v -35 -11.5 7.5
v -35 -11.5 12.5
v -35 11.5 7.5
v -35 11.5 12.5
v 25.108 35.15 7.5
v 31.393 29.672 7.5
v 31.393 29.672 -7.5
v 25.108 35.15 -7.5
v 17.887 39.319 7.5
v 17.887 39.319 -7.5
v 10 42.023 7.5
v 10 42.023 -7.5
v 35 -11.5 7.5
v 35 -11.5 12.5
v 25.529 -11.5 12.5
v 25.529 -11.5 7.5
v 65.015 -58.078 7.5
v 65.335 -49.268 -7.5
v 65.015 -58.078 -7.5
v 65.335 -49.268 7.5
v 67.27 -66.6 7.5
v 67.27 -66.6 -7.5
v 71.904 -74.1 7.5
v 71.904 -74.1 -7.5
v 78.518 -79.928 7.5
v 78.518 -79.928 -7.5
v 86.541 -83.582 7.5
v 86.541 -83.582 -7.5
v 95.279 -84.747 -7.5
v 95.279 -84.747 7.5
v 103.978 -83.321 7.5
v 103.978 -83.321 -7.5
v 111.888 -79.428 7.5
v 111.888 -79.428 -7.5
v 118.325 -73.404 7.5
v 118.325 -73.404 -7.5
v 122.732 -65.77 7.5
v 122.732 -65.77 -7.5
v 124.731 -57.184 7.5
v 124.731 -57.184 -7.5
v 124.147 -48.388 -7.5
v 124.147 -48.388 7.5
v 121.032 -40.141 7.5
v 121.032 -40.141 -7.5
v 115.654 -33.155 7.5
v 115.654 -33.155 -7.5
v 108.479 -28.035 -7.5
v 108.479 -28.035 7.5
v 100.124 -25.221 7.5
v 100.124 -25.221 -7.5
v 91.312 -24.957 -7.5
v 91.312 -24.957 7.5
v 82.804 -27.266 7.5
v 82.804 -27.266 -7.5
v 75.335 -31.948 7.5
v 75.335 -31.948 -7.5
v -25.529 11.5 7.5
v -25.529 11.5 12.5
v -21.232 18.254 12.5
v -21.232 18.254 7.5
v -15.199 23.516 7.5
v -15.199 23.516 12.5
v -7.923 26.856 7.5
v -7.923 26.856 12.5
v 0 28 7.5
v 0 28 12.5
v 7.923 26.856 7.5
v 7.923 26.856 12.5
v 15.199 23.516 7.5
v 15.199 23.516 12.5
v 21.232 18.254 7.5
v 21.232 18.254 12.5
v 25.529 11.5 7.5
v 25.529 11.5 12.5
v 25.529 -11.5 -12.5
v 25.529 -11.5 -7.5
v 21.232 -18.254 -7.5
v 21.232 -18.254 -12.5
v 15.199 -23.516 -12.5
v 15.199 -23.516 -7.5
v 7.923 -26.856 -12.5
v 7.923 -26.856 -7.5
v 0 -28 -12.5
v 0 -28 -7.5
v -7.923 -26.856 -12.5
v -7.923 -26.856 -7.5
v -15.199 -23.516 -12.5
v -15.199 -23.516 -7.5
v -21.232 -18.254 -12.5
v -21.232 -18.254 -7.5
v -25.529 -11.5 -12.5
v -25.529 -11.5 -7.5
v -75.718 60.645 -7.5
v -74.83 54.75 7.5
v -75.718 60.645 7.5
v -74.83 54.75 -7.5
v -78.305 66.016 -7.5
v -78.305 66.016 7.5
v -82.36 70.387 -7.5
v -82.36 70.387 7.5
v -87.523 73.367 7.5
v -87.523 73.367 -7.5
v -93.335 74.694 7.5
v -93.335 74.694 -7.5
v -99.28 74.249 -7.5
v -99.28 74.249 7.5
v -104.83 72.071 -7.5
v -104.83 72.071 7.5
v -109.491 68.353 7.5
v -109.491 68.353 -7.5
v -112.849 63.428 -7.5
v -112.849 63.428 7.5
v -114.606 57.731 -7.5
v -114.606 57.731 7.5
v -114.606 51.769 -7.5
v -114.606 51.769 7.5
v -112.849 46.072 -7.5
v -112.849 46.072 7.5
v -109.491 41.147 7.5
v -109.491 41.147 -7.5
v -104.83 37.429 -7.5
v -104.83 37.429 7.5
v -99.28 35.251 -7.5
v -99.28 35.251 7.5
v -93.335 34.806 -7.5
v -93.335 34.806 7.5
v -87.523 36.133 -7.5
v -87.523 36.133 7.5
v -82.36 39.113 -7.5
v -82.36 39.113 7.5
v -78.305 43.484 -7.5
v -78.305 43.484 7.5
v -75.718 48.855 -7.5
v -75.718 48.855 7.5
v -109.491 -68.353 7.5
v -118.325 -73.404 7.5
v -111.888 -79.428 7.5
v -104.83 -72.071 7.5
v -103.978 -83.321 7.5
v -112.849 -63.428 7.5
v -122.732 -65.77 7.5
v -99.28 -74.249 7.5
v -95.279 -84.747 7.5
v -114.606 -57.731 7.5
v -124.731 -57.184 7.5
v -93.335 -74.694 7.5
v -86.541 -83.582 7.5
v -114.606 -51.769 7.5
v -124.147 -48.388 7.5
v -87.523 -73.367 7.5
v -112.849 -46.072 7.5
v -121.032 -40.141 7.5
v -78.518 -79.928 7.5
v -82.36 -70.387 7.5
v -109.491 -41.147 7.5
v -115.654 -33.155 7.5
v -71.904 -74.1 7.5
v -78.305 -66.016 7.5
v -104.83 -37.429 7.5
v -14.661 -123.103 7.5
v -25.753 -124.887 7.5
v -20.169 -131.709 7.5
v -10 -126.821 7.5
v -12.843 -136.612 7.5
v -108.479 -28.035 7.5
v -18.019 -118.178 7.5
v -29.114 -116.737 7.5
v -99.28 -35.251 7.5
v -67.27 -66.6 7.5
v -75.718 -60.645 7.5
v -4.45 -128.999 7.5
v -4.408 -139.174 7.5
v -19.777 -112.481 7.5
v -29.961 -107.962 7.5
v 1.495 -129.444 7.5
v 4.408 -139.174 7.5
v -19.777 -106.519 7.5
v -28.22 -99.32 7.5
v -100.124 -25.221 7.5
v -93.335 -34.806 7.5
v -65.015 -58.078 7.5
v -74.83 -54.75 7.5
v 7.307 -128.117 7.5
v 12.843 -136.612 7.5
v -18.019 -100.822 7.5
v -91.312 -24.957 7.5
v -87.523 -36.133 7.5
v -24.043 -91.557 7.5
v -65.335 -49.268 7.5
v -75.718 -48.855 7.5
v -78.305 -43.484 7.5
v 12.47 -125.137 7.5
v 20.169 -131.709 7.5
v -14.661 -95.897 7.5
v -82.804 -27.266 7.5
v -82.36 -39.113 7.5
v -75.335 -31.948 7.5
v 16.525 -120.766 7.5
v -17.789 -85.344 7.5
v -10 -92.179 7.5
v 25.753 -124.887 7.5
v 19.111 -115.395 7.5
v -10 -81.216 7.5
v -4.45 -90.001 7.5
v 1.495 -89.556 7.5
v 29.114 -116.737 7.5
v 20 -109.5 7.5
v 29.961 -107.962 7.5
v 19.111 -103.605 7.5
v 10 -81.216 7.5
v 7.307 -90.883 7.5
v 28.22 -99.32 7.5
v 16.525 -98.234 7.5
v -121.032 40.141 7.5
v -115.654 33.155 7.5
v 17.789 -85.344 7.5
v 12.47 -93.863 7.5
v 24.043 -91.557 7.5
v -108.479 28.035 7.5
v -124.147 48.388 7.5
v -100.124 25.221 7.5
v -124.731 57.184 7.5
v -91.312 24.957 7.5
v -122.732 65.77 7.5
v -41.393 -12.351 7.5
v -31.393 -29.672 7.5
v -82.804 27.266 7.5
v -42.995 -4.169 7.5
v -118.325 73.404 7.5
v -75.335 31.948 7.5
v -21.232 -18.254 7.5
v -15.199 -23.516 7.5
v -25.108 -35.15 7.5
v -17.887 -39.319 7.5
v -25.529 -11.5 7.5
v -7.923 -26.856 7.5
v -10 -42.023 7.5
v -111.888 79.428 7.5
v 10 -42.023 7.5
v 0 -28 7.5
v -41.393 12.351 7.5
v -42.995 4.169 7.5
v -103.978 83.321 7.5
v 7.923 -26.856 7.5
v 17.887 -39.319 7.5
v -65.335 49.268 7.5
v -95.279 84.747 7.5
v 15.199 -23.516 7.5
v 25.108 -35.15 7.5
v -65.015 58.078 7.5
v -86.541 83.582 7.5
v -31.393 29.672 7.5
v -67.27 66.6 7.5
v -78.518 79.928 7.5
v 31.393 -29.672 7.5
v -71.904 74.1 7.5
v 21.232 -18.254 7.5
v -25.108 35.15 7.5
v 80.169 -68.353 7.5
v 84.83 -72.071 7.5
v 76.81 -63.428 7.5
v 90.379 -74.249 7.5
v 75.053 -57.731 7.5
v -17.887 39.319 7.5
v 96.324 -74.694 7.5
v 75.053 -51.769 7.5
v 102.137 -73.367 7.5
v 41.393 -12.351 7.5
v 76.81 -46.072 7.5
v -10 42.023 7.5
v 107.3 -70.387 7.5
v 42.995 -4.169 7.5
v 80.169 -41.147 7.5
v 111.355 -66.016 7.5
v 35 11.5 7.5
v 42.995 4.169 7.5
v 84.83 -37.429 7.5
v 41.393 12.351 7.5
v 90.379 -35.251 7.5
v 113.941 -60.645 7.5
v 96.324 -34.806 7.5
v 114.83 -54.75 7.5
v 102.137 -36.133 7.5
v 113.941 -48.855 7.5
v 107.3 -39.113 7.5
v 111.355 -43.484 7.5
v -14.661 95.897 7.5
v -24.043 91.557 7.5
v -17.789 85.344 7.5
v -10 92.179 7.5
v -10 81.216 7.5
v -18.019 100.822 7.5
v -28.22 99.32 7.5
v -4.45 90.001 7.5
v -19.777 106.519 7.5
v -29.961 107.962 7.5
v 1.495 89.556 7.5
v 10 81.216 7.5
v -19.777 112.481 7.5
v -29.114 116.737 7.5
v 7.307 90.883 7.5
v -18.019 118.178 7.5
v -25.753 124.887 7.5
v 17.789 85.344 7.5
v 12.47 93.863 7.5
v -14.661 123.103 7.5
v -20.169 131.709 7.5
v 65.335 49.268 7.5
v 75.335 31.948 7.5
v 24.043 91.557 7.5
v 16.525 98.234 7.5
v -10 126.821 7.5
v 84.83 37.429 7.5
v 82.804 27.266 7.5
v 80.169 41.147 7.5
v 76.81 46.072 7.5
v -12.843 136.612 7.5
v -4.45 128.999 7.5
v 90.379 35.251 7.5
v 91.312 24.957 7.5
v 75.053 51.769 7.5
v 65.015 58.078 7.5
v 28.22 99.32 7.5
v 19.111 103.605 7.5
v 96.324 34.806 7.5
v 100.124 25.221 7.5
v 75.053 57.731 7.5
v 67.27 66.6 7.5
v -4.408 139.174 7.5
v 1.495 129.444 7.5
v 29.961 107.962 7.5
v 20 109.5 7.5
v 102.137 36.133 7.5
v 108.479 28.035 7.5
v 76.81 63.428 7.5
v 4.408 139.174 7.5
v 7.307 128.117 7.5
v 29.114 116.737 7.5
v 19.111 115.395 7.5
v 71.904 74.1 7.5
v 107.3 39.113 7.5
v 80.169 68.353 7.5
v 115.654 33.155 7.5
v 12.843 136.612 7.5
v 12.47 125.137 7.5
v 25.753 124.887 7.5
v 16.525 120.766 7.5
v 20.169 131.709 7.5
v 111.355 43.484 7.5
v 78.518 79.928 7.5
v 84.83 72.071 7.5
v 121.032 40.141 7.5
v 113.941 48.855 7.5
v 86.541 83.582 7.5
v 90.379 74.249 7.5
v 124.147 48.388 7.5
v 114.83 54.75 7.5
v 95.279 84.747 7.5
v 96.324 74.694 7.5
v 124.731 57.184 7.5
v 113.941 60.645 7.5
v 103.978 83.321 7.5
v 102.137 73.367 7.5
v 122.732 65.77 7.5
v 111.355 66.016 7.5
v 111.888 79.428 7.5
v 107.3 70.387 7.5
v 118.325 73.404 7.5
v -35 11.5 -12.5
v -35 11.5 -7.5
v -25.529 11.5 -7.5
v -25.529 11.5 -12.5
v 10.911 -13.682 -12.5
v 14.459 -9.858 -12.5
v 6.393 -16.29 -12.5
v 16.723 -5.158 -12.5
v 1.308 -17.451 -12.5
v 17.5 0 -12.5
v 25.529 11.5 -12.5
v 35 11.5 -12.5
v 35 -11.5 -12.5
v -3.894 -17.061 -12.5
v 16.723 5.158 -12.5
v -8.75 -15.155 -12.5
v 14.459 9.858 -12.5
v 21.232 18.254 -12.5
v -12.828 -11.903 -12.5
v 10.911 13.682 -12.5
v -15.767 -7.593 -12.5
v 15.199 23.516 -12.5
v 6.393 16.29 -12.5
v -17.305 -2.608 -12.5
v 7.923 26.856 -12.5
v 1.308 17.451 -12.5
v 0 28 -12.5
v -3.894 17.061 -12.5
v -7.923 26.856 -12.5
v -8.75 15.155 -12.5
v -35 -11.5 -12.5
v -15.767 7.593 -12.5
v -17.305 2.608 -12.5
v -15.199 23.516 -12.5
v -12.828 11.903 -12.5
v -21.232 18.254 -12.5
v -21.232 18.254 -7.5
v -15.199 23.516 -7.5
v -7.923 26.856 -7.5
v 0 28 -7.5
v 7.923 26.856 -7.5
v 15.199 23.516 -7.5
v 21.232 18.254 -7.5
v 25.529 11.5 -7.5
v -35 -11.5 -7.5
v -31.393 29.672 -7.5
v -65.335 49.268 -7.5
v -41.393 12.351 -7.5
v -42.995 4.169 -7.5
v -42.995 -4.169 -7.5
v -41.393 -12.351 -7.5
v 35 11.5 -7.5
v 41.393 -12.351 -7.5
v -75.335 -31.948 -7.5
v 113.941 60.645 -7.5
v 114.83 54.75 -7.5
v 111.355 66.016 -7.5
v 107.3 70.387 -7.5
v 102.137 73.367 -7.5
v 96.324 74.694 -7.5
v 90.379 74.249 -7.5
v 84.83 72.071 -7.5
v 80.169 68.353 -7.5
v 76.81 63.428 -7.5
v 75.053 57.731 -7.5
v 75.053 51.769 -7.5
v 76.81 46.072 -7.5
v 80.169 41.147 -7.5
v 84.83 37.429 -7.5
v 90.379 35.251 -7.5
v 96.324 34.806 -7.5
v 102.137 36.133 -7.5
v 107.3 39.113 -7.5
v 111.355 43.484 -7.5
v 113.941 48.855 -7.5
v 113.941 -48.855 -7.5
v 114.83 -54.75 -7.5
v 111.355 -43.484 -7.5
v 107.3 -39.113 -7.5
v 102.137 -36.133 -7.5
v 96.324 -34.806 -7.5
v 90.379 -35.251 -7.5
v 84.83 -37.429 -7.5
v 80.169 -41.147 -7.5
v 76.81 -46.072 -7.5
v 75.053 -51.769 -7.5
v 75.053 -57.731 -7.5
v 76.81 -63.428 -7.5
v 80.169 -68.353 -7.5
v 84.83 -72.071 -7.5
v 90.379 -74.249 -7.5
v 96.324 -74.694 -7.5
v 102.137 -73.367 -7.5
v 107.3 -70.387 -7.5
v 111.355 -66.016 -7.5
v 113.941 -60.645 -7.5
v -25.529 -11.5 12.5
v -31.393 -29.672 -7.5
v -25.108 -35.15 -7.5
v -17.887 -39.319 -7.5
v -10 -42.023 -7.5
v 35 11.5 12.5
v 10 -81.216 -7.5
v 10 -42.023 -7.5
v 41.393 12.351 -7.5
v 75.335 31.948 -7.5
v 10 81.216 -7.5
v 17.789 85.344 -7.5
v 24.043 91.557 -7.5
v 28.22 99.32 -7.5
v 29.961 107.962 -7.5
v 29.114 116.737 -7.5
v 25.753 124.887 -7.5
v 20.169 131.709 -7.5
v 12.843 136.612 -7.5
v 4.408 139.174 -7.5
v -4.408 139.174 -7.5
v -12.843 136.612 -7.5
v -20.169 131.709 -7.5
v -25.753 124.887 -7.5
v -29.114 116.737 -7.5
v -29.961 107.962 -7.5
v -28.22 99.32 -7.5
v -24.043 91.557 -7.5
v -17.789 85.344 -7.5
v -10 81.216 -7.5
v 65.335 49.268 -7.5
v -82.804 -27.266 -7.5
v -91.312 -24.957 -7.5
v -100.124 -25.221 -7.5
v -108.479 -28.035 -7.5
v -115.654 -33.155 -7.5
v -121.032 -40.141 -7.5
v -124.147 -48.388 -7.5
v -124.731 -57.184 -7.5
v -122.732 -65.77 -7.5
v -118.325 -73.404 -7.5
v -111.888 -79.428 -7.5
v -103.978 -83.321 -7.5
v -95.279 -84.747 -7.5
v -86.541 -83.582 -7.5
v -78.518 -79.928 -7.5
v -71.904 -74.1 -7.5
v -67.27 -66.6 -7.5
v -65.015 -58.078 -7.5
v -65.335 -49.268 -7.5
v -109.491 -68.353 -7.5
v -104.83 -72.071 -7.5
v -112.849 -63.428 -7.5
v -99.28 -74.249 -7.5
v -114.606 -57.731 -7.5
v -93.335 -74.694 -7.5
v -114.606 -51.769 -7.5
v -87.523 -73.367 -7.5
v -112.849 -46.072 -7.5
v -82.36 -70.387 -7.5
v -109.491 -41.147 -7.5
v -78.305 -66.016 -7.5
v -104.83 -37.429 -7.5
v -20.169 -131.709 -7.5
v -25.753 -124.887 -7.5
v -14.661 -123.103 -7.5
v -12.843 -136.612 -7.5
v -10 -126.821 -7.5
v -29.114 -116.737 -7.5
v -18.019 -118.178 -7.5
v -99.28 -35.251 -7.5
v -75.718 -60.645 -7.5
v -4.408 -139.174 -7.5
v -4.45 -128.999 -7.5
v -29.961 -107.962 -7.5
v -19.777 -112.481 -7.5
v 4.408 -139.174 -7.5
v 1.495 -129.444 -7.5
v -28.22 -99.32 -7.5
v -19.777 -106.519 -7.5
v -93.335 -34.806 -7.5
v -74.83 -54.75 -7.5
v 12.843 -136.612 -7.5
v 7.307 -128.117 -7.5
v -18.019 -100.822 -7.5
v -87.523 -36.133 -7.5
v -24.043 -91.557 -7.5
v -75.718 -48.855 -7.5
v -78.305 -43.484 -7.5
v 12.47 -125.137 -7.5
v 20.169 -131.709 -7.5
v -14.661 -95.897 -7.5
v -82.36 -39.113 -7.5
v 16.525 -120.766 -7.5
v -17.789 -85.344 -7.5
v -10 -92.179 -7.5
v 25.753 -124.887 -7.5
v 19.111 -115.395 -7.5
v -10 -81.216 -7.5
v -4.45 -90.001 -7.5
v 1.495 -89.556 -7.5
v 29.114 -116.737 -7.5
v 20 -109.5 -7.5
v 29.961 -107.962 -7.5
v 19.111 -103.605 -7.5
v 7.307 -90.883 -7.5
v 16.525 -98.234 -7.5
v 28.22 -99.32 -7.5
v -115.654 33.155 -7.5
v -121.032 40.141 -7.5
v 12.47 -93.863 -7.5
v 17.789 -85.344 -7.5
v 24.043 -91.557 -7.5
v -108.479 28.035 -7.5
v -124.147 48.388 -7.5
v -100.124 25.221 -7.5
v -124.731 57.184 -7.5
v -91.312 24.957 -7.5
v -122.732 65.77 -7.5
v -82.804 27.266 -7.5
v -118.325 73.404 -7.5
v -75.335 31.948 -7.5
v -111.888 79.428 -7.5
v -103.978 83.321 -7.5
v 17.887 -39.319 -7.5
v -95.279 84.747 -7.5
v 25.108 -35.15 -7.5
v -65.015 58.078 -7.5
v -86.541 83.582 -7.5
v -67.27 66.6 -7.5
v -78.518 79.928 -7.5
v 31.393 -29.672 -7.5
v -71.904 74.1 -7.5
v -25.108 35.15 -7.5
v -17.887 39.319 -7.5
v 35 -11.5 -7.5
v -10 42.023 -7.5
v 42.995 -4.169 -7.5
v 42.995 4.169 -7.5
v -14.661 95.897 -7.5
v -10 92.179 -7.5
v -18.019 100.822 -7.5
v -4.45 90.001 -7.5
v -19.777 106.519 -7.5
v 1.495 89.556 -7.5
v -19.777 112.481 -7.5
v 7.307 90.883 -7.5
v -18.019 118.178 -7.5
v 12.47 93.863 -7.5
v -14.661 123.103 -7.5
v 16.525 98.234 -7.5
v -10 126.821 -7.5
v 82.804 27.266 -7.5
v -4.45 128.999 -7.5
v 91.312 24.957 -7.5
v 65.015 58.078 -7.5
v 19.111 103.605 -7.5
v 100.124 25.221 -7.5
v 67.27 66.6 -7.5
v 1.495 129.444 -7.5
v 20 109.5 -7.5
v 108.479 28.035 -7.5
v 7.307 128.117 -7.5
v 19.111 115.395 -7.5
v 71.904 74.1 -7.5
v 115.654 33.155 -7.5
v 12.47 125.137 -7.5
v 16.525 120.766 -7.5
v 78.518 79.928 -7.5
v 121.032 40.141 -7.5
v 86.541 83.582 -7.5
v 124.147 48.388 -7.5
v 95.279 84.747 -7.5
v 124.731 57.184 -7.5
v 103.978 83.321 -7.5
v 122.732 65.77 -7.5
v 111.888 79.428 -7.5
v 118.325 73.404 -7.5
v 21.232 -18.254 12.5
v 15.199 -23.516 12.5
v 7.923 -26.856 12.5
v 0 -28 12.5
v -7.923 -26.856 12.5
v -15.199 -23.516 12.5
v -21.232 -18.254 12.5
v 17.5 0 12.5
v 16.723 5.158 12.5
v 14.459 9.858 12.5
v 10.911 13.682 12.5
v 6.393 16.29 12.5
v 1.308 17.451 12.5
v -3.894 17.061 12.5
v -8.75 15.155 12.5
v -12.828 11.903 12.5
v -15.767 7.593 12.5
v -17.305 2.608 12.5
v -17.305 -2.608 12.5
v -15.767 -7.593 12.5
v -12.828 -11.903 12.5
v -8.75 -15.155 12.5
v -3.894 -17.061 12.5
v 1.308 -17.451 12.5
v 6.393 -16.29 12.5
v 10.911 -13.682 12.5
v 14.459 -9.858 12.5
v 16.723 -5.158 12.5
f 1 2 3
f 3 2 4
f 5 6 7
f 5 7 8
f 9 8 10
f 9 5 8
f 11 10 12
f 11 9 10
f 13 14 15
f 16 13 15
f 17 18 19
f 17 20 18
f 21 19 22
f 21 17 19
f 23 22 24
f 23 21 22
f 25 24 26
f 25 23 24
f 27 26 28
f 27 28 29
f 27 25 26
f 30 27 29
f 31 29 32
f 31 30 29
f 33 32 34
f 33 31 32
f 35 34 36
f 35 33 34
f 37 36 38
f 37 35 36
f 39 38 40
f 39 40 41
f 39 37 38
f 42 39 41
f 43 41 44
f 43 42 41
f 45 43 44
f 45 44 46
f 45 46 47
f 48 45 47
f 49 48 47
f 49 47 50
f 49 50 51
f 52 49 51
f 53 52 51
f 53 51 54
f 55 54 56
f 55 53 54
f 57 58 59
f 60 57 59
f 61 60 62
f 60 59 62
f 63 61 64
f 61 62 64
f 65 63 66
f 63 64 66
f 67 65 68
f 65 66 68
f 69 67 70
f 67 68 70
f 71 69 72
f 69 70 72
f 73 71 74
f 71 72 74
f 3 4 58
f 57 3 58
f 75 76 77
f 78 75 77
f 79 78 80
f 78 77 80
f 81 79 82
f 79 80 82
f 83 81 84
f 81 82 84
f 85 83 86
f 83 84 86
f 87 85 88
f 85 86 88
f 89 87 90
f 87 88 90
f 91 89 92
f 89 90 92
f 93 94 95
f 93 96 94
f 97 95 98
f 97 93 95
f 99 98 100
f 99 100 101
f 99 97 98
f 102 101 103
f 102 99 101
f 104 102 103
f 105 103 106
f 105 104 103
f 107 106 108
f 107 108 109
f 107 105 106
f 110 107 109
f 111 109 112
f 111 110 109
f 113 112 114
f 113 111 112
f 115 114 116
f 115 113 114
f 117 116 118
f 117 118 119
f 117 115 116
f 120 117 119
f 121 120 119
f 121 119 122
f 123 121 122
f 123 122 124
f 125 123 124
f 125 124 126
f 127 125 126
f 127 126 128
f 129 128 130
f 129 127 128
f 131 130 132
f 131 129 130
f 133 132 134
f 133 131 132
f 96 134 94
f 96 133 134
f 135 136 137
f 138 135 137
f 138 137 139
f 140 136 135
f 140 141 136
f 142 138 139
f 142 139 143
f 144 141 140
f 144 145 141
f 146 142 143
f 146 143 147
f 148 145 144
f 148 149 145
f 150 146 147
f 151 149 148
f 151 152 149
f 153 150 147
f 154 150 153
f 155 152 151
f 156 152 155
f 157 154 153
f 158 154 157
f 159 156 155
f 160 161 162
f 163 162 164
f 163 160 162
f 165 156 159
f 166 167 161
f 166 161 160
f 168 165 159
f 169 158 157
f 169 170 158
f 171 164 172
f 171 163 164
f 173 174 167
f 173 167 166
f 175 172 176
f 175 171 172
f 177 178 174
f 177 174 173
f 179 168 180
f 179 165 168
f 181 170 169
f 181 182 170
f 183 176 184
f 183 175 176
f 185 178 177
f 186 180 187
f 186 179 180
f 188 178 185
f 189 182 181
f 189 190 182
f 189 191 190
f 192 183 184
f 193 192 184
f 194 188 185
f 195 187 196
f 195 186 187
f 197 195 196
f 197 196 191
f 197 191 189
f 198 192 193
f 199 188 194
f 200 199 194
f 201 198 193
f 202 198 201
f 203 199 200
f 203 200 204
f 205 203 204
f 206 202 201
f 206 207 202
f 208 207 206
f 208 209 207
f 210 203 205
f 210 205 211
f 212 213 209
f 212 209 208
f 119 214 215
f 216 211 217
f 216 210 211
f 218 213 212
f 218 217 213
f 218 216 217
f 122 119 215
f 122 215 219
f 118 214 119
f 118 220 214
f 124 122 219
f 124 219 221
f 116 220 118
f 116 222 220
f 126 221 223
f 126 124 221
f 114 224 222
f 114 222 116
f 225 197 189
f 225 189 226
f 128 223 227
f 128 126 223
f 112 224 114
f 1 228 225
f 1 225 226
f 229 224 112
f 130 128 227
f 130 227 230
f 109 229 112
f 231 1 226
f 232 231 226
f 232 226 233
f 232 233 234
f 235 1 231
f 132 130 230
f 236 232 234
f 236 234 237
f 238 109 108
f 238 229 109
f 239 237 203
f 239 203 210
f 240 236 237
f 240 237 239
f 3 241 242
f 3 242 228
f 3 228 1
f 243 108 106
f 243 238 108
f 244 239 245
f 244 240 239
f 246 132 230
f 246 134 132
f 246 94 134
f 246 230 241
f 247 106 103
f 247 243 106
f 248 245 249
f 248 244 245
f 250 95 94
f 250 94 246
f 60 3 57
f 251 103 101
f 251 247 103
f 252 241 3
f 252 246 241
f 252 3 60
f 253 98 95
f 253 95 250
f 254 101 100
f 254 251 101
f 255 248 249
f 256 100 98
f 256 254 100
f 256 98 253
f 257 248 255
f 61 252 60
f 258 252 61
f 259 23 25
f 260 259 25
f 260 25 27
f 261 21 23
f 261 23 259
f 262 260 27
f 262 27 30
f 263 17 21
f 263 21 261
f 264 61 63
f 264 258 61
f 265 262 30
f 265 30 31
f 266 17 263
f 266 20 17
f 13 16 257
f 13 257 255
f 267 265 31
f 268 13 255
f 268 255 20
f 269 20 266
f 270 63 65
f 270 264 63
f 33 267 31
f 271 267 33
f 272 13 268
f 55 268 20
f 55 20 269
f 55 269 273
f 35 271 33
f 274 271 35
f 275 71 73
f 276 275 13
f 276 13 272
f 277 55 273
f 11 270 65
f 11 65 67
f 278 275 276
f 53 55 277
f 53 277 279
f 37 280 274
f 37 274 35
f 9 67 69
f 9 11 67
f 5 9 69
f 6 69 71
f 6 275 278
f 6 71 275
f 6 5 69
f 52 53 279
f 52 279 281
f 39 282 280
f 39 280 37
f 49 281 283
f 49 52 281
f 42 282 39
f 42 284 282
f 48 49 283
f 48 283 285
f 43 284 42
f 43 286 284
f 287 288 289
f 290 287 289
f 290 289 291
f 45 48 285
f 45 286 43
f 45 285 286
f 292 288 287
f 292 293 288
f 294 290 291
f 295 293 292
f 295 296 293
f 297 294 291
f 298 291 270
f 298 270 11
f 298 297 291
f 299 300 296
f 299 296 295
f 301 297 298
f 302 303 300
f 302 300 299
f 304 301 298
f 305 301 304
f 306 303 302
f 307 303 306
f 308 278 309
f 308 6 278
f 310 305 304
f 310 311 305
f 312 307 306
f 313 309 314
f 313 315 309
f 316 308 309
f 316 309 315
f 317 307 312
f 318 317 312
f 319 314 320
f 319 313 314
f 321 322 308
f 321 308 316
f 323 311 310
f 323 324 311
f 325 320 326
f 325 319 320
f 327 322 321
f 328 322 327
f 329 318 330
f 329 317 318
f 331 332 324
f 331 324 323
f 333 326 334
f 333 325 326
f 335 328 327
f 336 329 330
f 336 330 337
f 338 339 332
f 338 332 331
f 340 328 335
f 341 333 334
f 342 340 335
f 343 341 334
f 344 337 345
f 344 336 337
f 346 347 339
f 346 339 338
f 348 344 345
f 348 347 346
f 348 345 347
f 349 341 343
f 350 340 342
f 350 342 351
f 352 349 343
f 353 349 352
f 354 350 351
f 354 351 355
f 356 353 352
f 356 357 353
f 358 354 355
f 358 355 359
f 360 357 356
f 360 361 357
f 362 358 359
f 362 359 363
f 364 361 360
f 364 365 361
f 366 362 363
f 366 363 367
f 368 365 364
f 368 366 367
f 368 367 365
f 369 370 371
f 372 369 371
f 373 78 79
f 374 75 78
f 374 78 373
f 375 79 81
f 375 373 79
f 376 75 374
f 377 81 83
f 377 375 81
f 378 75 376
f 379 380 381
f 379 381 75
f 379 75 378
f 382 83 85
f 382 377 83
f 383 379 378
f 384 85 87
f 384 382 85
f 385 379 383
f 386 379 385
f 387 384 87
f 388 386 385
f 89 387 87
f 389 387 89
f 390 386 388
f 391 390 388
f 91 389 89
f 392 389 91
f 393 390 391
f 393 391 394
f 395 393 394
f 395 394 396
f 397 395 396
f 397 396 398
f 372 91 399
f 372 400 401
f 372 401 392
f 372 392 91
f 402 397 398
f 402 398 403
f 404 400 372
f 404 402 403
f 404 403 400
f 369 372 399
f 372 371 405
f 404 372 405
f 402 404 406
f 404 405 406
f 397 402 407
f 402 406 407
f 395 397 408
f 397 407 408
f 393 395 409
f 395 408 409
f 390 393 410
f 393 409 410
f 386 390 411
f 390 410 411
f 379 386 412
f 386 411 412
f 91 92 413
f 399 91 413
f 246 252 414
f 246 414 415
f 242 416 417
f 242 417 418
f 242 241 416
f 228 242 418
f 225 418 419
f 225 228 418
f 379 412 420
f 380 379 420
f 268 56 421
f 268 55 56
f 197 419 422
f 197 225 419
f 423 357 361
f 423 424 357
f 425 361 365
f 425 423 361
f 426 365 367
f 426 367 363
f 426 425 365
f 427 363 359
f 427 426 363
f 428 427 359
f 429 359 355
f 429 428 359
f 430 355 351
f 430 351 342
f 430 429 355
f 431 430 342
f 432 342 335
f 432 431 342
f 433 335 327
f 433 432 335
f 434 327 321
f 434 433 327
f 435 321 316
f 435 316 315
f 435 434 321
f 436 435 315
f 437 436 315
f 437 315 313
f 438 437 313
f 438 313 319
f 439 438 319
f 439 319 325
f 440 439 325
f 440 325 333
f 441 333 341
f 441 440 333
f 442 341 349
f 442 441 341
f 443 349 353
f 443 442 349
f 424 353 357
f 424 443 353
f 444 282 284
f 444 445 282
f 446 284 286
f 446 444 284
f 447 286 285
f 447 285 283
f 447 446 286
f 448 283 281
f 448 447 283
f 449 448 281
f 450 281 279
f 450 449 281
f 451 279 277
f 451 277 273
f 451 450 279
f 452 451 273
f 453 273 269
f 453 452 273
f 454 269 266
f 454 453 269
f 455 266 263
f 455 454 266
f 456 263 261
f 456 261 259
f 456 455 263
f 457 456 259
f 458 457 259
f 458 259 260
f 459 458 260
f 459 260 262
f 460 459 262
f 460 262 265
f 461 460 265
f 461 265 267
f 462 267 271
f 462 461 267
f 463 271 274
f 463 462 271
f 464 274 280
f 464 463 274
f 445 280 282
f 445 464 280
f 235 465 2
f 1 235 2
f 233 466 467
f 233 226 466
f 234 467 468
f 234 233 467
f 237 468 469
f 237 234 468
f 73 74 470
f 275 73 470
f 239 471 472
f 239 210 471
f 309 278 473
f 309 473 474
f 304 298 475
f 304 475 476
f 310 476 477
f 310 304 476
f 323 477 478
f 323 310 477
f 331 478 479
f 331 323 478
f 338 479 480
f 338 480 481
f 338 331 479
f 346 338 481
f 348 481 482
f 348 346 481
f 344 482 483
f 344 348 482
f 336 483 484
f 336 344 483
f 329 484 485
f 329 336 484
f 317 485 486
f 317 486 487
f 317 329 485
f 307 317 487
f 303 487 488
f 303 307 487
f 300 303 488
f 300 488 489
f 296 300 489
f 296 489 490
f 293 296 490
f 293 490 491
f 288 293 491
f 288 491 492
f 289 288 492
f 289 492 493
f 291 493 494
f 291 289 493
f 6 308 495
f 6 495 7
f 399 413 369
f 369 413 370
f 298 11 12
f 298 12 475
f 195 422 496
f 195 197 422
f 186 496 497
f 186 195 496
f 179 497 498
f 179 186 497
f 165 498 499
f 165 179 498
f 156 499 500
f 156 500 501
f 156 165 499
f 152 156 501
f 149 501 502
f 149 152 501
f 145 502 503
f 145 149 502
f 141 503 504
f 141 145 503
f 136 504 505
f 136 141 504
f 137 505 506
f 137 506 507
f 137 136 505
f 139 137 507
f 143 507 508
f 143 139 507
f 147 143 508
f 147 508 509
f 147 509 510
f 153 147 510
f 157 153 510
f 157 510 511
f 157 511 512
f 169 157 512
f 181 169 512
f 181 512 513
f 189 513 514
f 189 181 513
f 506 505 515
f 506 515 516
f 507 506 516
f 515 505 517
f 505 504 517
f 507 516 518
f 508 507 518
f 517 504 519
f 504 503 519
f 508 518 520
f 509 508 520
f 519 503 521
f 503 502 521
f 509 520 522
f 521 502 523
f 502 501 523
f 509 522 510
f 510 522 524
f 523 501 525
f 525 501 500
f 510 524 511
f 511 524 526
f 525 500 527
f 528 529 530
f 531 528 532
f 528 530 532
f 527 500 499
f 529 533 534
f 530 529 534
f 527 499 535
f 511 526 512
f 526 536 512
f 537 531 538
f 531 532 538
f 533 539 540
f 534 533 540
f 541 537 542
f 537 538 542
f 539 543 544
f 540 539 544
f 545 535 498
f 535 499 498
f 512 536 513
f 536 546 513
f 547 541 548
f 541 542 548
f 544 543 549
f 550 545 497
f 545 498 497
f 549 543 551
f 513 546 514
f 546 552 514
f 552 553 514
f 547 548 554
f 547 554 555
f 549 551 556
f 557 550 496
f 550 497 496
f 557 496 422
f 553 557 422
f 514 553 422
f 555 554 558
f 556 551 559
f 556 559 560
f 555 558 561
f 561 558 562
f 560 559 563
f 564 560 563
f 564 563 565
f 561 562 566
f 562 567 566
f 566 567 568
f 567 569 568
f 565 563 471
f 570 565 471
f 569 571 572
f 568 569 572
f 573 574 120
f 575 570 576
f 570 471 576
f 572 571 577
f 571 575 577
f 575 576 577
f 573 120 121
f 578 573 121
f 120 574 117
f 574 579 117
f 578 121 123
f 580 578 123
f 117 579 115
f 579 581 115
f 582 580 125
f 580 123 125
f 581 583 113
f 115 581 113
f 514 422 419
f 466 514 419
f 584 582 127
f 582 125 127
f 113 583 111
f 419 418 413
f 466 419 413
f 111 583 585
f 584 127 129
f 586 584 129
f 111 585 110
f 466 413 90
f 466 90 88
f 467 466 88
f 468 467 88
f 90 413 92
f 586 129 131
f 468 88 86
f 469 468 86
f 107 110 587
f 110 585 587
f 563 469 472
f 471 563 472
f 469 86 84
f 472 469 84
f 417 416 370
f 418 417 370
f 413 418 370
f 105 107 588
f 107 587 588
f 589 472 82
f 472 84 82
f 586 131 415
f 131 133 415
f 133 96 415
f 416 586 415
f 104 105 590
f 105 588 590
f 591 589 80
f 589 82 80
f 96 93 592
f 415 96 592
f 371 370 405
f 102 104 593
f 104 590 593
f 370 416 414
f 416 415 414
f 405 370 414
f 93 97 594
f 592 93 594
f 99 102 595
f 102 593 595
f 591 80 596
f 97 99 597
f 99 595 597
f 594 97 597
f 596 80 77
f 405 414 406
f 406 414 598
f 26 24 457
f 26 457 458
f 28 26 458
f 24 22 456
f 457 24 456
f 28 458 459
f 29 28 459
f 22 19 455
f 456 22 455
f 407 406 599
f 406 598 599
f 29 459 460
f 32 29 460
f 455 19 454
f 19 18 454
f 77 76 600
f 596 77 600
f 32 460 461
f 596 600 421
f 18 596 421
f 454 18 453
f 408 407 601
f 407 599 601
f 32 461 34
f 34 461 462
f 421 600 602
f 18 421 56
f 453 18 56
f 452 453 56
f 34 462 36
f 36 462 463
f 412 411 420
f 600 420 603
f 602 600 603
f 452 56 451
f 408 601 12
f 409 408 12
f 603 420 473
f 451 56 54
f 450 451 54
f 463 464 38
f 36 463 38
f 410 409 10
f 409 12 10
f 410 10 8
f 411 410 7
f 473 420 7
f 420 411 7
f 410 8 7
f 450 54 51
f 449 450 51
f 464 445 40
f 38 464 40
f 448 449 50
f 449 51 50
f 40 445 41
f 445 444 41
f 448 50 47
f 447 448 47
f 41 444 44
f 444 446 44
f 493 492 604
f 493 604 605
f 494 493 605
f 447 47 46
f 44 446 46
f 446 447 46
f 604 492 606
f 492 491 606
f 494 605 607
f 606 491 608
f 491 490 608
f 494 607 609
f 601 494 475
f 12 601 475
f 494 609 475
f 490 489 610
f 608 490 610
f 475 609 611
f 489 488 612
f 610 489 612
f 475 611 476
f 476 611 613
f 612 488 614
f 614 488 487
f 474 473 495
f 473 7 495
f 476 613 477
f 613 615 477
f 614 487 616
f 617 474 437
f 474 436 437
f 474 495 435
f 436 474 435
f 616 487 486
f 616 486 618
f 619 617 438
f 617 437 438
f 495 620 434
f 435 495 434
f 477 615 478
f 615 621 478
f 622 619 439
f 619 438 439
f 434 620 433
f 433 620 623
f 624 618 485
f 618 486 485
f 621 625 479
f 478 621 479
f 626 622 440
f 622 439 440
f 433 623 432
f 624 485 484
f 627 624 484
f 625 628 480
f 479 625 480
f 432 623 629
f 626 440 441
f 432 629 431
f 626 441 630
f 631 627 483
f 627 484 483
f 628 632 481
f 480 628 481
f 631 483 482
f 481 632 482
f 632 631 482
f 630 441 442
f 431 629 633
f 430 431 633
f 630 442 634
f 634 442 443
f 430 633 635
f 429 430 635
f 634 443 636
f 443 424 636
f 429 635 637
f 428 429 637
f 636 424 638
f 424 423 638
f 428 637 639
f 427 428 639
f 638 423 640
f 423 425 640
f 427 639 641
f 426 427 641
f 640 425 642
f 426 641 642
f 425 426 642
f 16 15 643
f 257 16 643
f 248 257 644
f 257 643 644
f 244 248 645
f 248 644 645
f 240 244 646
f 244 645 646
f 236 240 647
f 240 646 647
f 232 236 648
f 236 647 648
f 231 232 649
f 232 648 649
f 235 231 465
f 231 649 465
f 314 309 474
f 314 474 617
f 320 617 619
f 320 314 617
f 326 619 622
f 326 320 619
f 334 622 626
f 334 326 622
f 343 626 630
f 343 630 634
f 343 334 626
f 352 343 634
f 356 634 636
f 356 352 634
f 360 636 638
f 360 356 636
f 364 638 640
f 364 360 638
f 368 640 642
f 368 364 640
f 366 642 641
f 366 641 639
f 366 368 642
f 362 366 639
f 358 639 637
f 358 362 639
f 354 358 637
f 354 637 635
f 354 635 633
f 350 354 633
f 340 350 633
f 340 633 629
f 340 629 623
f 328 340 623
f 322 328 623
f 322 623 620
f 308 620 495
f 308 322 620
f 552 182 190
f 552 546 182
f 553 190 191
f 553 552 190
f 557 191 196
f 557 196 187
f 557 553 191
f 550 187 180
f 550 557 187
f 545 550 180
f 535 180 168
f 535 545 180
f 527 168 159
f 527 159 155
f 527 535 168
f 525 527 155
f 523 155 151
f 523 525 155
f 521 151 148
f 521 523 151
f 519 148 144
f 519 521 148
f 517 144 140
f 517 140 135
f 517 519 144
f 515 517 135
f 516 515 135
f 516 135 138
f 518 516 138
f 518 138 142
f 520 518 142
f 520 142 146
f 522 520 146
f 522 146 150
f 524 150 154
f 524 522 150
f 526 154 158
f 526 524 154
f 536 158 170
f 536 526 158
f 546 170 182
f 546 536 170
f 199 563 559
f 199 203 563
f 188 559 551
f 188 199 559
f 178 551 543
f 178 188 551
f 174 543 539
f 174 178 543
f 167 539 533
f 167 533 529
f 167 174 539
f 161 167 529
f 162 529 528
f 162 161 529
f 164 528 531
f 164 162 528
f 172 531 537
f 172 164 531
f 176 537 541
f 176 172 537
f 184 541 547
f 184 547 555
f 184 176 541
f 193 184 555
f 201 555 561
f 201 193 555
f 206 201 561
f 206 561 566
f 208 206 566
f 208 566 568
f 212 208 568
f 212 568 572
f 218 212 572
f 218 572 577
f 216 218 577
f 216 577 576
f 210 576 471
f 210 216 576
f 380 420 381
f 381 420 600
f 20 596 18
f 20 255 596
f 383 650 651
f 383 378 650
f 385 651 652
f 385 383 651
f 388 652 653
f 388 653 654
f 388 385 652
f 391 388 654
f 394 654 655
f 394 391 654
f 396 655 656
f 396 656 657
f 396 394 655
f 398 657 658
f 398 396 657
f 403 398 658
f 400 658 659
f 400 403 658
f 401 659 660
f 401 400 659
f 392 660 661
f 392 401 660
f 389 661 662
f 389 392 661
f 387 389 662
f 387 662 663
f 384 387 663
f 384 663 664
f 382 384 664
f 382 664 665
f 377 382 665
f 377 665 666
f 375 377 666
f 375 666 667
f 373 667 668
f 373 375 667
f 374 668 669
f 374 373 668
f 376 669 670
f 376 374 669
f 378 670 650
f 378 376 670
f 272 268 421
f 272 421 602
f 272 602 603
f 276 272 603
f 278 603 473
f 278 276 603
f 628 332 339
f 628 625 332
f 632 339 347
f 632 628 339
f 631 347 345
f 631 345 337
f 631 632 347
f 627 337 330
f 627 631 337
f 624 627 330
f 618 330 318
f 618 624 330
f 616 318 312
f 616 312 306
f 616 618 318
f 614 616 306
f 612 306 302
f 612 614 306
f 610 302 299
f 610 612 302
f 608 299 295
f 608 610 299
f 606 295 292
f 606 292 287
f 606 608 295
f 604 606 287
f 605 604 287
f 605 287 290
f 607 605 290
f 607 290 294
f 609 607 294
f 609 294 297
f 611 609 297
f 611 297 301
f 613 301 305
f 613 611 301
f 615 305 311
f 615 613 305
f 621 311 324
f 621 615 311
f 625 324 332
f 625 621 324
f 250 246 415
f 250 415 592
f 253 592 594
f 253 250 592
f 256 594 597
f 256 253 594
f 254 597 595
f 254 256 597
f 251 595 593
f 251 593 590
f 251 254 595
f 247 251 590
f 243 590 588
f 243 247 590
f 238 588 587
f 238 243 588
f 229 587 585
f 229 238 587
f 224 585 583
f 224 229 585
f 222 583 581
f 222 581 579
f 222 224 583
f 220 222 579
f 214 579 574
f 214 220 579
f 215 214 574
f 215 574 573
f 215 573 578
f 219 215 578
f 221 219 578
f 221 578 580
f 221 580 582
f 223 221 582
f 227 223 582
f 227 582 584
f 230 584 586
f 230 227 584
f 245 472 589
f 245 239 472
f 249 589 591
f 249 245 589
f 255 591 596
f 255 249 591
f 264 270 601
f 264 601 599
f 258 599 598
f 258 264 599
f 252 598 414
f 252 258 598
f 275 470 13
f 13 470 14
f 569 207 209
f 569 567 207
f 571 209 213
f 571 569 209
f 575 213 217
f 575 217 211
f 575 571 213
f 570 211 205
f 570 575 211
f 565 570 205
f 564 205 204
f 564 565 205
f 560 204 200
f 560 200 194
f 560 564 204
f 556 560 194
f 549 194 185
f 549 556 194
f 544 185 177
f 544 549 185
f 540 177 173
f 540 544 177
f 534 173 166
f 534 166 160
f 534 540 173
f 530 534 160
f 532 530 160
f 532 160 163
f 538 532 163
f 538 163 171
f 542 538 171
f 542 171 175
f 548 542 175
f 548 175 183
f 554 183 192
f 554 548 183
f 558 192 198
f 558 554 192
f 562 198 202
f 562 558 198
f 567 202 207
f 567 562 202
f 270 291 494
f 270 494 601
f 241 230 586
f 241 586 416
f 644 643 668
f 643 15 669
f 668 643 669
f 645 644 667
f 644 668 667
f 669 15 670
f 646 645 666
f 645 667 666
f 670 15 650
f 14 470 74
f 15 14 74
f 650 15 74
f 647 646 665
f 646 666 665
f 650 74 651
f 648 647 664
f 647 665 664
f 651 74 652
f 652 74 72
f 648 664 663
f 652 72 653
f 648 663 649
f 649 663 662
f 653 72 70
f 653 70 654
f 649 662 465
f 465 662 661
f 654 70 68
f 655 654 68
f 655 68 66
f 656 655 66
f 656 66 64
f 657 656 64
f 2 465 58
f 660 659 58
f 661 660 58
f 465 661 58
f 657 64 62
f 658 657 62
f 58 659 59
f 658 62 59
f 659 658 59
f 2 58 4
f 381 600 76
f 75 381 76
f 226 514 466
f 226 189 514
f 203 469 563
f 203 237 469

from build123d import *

# Parameters (mm, degrees)
SKETCH2_R           = 17.5
BOSS_EXTRUDE2_DEPTH = 12.5
SKETCH2_5_R         = 20
BOSS_EXTRUDE5_DEPTH = 7.5


with BuildPart() as part:
    # Sketch2 → Boss-Extrude2 (new, symmetric)
    with BuildSketch(Plane.XY):
        with BuildLine():
            Line((25.529394822, 11.5), (35, 11.5))
            Line((35, 11.5), (35, -11.5))
            Line((35, -11.5), (25.529394822, -11.5))
            ThreePointArc((25.529394822, -11.5), (0, -28), (-25.529394822, -11.5))
            Line((-25.529394822, -11.5), (-35, -11.5))
            Line((-35, -11.5), (-35, 11.5))
            Line((-35, 11.5), (-25.529394822, 11.5))
            ThreePointArc((-25.529394822, 11.5), (0, 28), (25.529394822, 11.5))
        make_face()
        Circle(SKETCH2_R, mode=Mode.SUBTRACT)
    extrude(amount=BOSS_EXTRUDE2_DEPTH, both=True)

    # Sketch2<5> → Boss-Extrude5 (add, symmetric)
    with BuildSketch(Plane.XY):
        with BuildLine():
            Line((75.334884287, -31.947610338), (41.392953455, -12.351227436))
            ThreePointArc((41.392953455, -12.351227436), (43.196405116, 0), (41.392953455, 12.351227436))
            Line((41.392953455, 12.351227436), (75.334884287, 31.947610338))
            ThreePointArc((75.334884287, 31.947610338), (120.810543828, 69.75), (65.334884287, 49.268118414))
            Line((65.334884287, 49.268118414), (31.392953455, 29.671735512))
            ThreePointArc((31.392953455, 29.671735512), (21.598202558, 37.409184182), (10, 42.022962948))
            Line((10, 42.022962948), (10, 81.215728753))
            ThreePointArc((10, 81.215728753), (0, 139.5), (-10, 81.215728753))
            Line((-10, 81.215728753), (-10, 42.022962948))
            ThreePointArc((-10, 42.022962948), (-21.598202558, 37.409184182), (-31.392953455, 29.671735512))
            Line((-31.392953455, 29.671735512), (-65.334884287, 49.268118414))
            ThreePointArc((-65.334884287, 49.268118414), (-120.810543828, 69.75), (-75.334884287, 31.947610338))
            Line((-75.334884287, 31.947610338), (-41.392953455, 12.351227436))
            ThreePointArc((-41.392953455, 12.351227436), (-43.196405116, 0), (-41.392953455, -12.351227436))
            Line((-41.392953455, -12.351227436), (-75.334884287, -31.947610338))
            ThreePointArc((-75.334884287, -31.947610338), (-120.810543828, -69.75), (-65.334884287, -49.268118414))
            Line((-65.334884287, -49.268118414), (-31.392953455, -29.671735512))
            ThreePointArc((-31.392953455, -29.671735512), (-21.598202558, -37.409184182), (-10, -42.022962948))
            Line((-10, -42.022962948), (-10, -81.215728753))
            ThreePointArc((-10, -81.215728753), (0, -139.5), (10, -81.215728753))
            Line((10, -81.215728753), (10, -42.022962948))
            ThreePointArc((10, -42.022962948), (21.598202558, -37.409184182), (31.392953455, -29.671735512))
            Line((31.392953455, -29.671735512), (65.334884287, -49.268118414))
            ThreePointArc((65.334884287, -49.268118414), (120.810543828, -69.75), (75.334884287, -31.947610338))
        make_face()
        with Locations((0, 109.5)):
            Circle(SKETCH2_5_R, mode=Mode.SUBTRACT)
        with Locations((94.829781714, 54.75)):
            Circle(SKETCH2_5_R, mode=Mode.SUBTRACT)
        with Locations((94.829781714, -54.75)):
            Circle(SKETCH2_5_R, mode=Mode.SUBTRACT)
        with Locations((0, -109.5)):
            Circle(SKETCH2_5_R, mode=Mode.SUBTRACT)
        with Locations((-94.829781714, -54.75)):
            Circle(SKETCH2_5_R, mode=Mode.SUBTRACT)
        with Locations((-94.829781714, 54.75)):
            Circle(SKETCH2_5_R, mode=Mode.SUBTRACT)
        with BuildLine():
            ThreePointArc((25.529394822, 11.5), (0, 28), (-25.529394822, 11.5))
            Line((-25.529394822, 11.5), (-35, 11.5))
            Line((-35, 11.5), (-35, -11.5))
            Line((-35, -11.5), (-25.529394822, -11.5))
            ThreePointArc((-25.529394822, -11.5), (0, -28), (25.529394822, -11.5))
            Line((25.529394822, -11.5), (35, -11.5))
            Line((35, -11.5), (35, 11.5))
            Line((35, 11.5), (25.529394822, 11.5))
        make_face(mode=Mode.SUBTRACT)
    extrude(amount=BOSS_EXTRUDE5_DEPTH, both=True)


solid = part.part
